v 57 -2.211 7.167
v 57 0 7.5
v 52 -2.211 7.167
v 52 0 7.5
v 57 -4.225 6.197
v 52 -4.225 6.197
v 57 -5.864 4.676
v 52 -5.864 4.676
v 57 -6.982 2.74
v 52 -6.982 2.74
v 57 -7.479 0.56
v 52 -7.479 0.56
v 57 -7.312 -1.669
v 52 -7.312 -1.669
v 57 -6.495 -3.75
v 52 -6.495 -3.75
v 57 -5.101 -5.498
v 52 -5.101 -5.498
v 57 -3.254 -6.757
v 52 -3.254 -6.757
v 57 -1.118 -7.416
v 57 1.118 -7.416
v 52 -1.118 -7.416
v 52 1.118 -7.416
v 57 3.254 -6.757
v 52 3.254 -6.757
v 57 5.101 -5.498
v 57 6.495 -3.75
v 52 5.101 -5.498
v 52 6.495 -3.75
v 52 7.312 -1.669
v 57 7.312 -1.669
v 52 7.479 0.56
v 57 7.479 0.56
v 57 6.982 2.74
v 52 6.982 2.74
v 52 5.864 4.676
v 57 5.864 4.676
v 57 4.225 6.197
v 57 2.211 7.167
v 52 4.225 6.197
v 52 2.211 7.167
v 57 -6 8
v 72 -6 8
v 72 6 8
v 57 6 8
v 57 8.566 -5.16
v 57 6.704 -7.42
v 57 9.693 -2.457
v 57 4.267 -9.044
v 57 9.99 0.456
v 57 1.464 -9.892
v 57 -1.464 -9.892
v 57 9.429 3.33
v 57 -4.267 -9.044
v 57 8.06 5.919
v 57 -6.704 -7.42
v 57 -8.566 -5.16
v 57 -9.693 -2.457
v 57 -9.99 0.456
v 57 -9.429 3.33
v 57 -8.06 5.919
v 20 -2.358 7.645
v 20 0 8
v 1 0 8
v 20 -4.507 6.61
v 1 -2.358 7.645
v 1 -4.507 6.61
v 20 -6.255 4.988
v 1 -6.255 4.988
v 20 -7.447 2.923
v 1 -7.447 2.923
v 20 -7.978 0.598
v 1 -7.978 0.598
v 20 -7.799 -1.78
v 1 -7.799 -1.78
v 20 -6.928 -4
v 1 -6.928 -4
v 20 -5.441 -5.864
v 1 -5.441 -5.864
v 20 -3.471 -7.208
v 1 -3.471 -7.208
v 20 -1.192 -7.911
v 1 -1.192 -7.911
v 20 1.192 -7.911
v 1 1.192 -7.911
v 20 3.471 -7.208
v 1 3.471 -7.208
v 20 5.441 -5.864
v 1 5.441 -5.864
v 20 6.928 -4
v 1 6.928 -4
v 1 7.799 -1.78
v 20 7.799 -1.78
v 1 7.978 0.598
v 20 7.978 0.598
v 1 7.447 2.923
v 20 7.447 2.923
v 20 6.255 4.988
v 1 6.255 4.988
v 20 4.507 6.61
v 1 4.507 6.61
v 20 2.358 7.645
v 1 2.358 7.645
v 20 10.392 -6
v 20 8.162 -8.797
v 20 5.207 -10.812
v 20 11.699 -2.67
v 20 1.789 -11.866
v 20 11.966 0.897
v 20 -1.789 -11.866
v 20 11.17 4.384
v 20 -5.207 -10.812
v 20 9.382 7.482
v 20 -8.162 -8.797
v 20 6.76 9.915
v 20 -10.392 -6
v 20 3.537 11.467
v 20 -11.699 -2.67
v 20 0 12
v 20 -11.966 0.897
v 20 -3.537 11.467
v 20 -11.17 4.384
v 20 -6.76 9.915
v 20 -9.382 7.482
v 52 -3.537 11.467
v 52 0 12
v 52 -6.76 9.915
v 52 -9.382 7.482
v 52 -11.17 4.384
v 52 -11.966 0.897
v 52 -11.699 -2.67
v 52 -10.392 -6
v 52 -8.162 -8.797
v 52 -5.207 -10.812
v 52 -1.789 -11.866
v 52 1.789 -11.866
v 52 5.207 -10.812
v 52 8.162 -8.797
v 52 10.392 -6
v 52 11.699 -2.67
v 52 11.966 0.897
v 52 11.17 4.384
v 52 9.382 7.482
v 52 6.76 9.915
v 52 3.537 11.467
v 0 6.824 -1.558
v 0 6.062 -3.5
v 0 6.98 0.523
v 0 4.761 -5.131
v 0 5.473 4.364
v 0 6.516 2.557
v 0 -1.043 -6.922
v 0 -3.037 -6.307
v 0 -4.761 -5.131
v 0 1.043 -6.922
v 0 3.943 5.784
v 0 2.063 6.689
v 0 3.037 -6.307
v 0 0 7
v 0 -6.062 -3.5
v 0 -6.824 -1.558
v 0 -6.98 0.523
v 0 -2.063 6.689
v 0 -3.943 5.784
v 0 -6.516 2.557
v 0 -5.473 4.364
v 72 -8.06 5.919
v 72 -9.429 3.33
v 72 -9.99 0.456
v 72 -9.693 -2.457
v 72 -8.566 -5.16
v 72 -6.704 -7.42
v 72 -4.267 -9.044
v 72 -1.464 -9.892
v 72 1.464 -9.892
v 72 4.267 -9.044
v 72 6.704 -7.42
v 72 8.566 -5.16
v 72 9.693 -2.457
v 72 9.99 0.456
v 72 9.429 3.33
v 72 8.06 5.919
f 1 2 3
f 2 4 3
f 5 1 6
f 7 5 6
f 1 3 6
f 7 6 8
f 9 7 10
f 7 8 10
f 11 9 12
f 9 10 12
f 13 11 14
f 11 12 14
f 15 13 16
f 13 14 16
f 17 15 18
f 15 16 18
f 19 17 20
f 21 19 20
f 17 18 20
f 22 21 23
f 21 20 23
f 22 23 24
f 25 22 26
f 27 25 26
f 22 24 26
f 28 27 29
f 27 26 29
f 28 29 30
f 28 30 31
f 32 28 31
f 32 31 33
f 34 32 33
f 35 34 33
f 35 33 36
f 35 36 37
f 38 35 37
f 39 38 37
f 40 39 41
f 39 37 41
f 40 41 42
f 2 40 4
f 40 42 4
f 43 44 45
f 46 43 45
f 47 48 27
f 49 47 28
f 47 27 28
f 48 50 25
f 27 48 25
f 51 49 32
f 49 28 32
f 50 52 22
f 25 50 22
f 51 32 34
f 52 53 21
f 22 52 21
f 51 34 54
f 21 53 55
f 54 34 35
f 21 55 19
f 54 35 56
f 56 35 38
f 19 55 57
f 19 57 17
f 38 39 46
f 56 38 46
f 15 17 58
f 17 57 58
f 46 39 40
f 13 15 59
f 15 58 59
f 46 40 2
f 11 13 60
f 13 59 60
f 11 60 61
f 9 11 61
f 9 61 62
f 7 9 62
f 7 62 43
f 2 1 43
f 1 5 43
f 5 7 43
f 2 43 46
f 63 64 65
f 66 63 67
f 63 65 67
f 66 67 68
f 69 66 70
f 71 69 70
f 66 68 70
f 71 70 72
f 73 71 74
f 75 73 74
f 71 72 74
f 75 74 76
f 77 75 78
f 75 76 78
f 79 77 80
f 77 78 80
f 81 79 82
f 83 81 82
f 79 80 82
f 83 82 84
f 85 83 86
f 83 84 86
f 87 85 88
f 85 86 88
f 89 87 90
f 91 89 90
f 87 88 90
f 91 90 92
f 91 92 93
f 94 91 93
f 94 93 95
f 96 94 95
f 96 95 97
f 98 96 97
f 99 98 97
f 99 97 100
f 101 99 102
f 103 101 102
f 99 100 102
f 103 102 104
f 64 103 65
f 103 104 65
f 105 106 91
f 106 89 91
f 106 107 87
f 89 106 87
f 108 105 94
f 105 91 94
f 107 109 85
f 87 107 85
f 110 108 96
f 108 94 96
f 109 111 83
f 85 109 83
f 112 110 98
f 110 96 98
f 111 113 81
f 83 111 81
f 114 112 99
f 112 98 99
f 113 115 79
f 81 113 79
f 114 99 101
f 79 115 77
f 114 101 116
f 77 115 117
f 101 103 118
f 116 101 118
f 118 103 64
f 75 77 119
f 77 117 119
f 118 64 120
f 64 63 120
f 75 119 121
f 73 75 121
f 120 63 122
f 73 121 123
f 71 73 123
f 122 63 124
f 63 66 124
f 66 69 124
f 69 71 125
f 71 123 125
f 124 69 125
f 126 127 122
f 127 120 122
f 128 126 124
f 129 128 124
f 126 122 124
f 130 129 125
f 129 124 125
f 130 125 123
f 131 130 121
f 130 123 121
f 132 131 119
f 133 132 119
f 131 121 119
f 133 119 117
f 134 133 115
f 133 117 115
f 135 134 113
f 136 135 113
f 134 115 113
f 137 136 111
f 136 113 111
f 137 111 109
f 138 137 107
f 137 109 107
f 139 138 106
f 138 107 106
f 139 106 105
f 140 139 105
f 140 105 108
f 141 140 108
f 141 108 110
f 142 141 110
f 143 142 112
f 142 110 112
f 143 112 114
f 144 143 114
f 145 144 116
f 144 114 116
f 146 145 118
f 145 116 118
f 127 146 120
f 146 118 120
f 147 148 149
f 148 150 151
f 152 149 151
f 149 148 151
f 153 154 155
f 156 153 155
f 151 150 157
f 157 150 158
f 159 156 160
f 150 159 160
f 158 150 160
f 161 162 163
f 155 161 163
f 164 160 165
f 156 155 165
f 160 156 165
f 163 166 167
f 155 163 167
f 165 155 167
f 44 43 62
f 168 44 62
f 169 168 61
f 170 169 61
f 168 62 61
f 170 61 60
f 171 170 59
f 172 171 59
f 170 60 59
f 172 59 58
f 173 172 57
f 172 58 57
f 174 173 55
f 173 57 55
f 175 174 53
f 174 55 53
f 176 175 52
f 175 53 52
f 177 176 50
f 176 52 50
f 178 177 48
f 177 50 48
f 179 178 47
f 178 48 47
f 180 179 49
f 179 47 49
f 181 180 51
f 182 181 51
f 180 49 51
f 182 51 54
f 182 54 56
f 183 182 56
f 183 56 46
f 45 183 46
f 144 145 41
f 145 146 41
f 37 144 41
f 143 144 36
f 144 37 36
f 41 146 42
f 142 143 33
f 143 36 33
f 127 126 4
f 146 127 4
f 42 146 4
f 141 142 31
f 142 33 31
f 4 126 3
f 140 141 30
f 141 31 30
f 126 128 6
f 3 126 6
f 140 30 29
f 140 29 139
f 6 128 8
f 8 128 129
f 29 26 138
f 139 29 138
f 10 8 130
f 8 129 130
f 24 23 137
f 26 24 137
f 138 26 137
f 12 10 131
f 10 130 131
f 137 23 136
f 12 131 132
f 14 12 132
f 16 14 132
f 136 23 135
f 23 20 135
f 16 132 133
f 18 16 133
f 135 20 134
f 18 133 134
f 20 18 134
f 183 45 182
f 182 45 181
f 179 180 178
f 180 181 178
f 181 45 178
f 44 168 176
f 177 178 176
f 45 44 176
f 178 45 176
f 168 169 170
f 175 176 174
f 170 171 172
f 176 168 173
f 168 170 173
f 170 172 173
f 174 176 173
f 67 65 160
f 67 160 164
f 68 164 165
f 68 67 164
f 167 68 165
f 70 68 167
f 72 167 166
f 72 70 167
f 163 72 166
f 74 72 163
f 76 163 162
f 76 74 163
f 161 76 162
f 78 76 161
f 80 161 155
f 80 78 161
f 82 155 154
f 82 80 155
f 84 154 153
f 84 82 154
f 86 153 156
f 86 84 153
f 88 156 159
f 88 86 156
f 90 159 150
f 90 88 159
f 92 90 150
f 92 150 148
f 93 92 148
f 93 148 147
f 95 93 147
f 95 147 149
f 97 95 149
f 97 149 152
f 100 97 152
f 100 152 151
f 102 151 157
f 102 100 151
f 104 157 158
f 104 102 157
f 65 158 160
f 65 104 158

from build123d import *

# Parameters (mm, degrees)
F2_SIZE  = 1
F4_DEPTH = 15


with BuildPart() as f1:
    # F0 (on Front) → F1 (revolve)
    with BuildSketch(Plane.XZ):
        Polygon((0, 8), (0, 0), (72, 0), (72, 10), (57, 10), (57, 7.5), (52, 7.5), (52, 12), (20, 12), (20, 8), align=None)
    revolve(axis=Axis((33.058259, 0, 0), (1, 0, 0)))

    # F2
    f2_edges = [f1.edges().sort_by_distance(p)[0] for p in [
        (0, 0, -8),
    ]]
    chamfer(f2_edges, length=F2_SIZE)

    # F3 (on face) → F4 (cut)
    with BuildSketch(Plane.YZ.offset(72)):
        with BuildLine():
            Line((-6, 8), (6, 8))
            ThreePointArc((6, 8), (0, 10), (-6, 8))
        make_face()
    extrude(amount=-F4_DEPTH, mode=Mode.SUBTRACT)


solid = f1.part
